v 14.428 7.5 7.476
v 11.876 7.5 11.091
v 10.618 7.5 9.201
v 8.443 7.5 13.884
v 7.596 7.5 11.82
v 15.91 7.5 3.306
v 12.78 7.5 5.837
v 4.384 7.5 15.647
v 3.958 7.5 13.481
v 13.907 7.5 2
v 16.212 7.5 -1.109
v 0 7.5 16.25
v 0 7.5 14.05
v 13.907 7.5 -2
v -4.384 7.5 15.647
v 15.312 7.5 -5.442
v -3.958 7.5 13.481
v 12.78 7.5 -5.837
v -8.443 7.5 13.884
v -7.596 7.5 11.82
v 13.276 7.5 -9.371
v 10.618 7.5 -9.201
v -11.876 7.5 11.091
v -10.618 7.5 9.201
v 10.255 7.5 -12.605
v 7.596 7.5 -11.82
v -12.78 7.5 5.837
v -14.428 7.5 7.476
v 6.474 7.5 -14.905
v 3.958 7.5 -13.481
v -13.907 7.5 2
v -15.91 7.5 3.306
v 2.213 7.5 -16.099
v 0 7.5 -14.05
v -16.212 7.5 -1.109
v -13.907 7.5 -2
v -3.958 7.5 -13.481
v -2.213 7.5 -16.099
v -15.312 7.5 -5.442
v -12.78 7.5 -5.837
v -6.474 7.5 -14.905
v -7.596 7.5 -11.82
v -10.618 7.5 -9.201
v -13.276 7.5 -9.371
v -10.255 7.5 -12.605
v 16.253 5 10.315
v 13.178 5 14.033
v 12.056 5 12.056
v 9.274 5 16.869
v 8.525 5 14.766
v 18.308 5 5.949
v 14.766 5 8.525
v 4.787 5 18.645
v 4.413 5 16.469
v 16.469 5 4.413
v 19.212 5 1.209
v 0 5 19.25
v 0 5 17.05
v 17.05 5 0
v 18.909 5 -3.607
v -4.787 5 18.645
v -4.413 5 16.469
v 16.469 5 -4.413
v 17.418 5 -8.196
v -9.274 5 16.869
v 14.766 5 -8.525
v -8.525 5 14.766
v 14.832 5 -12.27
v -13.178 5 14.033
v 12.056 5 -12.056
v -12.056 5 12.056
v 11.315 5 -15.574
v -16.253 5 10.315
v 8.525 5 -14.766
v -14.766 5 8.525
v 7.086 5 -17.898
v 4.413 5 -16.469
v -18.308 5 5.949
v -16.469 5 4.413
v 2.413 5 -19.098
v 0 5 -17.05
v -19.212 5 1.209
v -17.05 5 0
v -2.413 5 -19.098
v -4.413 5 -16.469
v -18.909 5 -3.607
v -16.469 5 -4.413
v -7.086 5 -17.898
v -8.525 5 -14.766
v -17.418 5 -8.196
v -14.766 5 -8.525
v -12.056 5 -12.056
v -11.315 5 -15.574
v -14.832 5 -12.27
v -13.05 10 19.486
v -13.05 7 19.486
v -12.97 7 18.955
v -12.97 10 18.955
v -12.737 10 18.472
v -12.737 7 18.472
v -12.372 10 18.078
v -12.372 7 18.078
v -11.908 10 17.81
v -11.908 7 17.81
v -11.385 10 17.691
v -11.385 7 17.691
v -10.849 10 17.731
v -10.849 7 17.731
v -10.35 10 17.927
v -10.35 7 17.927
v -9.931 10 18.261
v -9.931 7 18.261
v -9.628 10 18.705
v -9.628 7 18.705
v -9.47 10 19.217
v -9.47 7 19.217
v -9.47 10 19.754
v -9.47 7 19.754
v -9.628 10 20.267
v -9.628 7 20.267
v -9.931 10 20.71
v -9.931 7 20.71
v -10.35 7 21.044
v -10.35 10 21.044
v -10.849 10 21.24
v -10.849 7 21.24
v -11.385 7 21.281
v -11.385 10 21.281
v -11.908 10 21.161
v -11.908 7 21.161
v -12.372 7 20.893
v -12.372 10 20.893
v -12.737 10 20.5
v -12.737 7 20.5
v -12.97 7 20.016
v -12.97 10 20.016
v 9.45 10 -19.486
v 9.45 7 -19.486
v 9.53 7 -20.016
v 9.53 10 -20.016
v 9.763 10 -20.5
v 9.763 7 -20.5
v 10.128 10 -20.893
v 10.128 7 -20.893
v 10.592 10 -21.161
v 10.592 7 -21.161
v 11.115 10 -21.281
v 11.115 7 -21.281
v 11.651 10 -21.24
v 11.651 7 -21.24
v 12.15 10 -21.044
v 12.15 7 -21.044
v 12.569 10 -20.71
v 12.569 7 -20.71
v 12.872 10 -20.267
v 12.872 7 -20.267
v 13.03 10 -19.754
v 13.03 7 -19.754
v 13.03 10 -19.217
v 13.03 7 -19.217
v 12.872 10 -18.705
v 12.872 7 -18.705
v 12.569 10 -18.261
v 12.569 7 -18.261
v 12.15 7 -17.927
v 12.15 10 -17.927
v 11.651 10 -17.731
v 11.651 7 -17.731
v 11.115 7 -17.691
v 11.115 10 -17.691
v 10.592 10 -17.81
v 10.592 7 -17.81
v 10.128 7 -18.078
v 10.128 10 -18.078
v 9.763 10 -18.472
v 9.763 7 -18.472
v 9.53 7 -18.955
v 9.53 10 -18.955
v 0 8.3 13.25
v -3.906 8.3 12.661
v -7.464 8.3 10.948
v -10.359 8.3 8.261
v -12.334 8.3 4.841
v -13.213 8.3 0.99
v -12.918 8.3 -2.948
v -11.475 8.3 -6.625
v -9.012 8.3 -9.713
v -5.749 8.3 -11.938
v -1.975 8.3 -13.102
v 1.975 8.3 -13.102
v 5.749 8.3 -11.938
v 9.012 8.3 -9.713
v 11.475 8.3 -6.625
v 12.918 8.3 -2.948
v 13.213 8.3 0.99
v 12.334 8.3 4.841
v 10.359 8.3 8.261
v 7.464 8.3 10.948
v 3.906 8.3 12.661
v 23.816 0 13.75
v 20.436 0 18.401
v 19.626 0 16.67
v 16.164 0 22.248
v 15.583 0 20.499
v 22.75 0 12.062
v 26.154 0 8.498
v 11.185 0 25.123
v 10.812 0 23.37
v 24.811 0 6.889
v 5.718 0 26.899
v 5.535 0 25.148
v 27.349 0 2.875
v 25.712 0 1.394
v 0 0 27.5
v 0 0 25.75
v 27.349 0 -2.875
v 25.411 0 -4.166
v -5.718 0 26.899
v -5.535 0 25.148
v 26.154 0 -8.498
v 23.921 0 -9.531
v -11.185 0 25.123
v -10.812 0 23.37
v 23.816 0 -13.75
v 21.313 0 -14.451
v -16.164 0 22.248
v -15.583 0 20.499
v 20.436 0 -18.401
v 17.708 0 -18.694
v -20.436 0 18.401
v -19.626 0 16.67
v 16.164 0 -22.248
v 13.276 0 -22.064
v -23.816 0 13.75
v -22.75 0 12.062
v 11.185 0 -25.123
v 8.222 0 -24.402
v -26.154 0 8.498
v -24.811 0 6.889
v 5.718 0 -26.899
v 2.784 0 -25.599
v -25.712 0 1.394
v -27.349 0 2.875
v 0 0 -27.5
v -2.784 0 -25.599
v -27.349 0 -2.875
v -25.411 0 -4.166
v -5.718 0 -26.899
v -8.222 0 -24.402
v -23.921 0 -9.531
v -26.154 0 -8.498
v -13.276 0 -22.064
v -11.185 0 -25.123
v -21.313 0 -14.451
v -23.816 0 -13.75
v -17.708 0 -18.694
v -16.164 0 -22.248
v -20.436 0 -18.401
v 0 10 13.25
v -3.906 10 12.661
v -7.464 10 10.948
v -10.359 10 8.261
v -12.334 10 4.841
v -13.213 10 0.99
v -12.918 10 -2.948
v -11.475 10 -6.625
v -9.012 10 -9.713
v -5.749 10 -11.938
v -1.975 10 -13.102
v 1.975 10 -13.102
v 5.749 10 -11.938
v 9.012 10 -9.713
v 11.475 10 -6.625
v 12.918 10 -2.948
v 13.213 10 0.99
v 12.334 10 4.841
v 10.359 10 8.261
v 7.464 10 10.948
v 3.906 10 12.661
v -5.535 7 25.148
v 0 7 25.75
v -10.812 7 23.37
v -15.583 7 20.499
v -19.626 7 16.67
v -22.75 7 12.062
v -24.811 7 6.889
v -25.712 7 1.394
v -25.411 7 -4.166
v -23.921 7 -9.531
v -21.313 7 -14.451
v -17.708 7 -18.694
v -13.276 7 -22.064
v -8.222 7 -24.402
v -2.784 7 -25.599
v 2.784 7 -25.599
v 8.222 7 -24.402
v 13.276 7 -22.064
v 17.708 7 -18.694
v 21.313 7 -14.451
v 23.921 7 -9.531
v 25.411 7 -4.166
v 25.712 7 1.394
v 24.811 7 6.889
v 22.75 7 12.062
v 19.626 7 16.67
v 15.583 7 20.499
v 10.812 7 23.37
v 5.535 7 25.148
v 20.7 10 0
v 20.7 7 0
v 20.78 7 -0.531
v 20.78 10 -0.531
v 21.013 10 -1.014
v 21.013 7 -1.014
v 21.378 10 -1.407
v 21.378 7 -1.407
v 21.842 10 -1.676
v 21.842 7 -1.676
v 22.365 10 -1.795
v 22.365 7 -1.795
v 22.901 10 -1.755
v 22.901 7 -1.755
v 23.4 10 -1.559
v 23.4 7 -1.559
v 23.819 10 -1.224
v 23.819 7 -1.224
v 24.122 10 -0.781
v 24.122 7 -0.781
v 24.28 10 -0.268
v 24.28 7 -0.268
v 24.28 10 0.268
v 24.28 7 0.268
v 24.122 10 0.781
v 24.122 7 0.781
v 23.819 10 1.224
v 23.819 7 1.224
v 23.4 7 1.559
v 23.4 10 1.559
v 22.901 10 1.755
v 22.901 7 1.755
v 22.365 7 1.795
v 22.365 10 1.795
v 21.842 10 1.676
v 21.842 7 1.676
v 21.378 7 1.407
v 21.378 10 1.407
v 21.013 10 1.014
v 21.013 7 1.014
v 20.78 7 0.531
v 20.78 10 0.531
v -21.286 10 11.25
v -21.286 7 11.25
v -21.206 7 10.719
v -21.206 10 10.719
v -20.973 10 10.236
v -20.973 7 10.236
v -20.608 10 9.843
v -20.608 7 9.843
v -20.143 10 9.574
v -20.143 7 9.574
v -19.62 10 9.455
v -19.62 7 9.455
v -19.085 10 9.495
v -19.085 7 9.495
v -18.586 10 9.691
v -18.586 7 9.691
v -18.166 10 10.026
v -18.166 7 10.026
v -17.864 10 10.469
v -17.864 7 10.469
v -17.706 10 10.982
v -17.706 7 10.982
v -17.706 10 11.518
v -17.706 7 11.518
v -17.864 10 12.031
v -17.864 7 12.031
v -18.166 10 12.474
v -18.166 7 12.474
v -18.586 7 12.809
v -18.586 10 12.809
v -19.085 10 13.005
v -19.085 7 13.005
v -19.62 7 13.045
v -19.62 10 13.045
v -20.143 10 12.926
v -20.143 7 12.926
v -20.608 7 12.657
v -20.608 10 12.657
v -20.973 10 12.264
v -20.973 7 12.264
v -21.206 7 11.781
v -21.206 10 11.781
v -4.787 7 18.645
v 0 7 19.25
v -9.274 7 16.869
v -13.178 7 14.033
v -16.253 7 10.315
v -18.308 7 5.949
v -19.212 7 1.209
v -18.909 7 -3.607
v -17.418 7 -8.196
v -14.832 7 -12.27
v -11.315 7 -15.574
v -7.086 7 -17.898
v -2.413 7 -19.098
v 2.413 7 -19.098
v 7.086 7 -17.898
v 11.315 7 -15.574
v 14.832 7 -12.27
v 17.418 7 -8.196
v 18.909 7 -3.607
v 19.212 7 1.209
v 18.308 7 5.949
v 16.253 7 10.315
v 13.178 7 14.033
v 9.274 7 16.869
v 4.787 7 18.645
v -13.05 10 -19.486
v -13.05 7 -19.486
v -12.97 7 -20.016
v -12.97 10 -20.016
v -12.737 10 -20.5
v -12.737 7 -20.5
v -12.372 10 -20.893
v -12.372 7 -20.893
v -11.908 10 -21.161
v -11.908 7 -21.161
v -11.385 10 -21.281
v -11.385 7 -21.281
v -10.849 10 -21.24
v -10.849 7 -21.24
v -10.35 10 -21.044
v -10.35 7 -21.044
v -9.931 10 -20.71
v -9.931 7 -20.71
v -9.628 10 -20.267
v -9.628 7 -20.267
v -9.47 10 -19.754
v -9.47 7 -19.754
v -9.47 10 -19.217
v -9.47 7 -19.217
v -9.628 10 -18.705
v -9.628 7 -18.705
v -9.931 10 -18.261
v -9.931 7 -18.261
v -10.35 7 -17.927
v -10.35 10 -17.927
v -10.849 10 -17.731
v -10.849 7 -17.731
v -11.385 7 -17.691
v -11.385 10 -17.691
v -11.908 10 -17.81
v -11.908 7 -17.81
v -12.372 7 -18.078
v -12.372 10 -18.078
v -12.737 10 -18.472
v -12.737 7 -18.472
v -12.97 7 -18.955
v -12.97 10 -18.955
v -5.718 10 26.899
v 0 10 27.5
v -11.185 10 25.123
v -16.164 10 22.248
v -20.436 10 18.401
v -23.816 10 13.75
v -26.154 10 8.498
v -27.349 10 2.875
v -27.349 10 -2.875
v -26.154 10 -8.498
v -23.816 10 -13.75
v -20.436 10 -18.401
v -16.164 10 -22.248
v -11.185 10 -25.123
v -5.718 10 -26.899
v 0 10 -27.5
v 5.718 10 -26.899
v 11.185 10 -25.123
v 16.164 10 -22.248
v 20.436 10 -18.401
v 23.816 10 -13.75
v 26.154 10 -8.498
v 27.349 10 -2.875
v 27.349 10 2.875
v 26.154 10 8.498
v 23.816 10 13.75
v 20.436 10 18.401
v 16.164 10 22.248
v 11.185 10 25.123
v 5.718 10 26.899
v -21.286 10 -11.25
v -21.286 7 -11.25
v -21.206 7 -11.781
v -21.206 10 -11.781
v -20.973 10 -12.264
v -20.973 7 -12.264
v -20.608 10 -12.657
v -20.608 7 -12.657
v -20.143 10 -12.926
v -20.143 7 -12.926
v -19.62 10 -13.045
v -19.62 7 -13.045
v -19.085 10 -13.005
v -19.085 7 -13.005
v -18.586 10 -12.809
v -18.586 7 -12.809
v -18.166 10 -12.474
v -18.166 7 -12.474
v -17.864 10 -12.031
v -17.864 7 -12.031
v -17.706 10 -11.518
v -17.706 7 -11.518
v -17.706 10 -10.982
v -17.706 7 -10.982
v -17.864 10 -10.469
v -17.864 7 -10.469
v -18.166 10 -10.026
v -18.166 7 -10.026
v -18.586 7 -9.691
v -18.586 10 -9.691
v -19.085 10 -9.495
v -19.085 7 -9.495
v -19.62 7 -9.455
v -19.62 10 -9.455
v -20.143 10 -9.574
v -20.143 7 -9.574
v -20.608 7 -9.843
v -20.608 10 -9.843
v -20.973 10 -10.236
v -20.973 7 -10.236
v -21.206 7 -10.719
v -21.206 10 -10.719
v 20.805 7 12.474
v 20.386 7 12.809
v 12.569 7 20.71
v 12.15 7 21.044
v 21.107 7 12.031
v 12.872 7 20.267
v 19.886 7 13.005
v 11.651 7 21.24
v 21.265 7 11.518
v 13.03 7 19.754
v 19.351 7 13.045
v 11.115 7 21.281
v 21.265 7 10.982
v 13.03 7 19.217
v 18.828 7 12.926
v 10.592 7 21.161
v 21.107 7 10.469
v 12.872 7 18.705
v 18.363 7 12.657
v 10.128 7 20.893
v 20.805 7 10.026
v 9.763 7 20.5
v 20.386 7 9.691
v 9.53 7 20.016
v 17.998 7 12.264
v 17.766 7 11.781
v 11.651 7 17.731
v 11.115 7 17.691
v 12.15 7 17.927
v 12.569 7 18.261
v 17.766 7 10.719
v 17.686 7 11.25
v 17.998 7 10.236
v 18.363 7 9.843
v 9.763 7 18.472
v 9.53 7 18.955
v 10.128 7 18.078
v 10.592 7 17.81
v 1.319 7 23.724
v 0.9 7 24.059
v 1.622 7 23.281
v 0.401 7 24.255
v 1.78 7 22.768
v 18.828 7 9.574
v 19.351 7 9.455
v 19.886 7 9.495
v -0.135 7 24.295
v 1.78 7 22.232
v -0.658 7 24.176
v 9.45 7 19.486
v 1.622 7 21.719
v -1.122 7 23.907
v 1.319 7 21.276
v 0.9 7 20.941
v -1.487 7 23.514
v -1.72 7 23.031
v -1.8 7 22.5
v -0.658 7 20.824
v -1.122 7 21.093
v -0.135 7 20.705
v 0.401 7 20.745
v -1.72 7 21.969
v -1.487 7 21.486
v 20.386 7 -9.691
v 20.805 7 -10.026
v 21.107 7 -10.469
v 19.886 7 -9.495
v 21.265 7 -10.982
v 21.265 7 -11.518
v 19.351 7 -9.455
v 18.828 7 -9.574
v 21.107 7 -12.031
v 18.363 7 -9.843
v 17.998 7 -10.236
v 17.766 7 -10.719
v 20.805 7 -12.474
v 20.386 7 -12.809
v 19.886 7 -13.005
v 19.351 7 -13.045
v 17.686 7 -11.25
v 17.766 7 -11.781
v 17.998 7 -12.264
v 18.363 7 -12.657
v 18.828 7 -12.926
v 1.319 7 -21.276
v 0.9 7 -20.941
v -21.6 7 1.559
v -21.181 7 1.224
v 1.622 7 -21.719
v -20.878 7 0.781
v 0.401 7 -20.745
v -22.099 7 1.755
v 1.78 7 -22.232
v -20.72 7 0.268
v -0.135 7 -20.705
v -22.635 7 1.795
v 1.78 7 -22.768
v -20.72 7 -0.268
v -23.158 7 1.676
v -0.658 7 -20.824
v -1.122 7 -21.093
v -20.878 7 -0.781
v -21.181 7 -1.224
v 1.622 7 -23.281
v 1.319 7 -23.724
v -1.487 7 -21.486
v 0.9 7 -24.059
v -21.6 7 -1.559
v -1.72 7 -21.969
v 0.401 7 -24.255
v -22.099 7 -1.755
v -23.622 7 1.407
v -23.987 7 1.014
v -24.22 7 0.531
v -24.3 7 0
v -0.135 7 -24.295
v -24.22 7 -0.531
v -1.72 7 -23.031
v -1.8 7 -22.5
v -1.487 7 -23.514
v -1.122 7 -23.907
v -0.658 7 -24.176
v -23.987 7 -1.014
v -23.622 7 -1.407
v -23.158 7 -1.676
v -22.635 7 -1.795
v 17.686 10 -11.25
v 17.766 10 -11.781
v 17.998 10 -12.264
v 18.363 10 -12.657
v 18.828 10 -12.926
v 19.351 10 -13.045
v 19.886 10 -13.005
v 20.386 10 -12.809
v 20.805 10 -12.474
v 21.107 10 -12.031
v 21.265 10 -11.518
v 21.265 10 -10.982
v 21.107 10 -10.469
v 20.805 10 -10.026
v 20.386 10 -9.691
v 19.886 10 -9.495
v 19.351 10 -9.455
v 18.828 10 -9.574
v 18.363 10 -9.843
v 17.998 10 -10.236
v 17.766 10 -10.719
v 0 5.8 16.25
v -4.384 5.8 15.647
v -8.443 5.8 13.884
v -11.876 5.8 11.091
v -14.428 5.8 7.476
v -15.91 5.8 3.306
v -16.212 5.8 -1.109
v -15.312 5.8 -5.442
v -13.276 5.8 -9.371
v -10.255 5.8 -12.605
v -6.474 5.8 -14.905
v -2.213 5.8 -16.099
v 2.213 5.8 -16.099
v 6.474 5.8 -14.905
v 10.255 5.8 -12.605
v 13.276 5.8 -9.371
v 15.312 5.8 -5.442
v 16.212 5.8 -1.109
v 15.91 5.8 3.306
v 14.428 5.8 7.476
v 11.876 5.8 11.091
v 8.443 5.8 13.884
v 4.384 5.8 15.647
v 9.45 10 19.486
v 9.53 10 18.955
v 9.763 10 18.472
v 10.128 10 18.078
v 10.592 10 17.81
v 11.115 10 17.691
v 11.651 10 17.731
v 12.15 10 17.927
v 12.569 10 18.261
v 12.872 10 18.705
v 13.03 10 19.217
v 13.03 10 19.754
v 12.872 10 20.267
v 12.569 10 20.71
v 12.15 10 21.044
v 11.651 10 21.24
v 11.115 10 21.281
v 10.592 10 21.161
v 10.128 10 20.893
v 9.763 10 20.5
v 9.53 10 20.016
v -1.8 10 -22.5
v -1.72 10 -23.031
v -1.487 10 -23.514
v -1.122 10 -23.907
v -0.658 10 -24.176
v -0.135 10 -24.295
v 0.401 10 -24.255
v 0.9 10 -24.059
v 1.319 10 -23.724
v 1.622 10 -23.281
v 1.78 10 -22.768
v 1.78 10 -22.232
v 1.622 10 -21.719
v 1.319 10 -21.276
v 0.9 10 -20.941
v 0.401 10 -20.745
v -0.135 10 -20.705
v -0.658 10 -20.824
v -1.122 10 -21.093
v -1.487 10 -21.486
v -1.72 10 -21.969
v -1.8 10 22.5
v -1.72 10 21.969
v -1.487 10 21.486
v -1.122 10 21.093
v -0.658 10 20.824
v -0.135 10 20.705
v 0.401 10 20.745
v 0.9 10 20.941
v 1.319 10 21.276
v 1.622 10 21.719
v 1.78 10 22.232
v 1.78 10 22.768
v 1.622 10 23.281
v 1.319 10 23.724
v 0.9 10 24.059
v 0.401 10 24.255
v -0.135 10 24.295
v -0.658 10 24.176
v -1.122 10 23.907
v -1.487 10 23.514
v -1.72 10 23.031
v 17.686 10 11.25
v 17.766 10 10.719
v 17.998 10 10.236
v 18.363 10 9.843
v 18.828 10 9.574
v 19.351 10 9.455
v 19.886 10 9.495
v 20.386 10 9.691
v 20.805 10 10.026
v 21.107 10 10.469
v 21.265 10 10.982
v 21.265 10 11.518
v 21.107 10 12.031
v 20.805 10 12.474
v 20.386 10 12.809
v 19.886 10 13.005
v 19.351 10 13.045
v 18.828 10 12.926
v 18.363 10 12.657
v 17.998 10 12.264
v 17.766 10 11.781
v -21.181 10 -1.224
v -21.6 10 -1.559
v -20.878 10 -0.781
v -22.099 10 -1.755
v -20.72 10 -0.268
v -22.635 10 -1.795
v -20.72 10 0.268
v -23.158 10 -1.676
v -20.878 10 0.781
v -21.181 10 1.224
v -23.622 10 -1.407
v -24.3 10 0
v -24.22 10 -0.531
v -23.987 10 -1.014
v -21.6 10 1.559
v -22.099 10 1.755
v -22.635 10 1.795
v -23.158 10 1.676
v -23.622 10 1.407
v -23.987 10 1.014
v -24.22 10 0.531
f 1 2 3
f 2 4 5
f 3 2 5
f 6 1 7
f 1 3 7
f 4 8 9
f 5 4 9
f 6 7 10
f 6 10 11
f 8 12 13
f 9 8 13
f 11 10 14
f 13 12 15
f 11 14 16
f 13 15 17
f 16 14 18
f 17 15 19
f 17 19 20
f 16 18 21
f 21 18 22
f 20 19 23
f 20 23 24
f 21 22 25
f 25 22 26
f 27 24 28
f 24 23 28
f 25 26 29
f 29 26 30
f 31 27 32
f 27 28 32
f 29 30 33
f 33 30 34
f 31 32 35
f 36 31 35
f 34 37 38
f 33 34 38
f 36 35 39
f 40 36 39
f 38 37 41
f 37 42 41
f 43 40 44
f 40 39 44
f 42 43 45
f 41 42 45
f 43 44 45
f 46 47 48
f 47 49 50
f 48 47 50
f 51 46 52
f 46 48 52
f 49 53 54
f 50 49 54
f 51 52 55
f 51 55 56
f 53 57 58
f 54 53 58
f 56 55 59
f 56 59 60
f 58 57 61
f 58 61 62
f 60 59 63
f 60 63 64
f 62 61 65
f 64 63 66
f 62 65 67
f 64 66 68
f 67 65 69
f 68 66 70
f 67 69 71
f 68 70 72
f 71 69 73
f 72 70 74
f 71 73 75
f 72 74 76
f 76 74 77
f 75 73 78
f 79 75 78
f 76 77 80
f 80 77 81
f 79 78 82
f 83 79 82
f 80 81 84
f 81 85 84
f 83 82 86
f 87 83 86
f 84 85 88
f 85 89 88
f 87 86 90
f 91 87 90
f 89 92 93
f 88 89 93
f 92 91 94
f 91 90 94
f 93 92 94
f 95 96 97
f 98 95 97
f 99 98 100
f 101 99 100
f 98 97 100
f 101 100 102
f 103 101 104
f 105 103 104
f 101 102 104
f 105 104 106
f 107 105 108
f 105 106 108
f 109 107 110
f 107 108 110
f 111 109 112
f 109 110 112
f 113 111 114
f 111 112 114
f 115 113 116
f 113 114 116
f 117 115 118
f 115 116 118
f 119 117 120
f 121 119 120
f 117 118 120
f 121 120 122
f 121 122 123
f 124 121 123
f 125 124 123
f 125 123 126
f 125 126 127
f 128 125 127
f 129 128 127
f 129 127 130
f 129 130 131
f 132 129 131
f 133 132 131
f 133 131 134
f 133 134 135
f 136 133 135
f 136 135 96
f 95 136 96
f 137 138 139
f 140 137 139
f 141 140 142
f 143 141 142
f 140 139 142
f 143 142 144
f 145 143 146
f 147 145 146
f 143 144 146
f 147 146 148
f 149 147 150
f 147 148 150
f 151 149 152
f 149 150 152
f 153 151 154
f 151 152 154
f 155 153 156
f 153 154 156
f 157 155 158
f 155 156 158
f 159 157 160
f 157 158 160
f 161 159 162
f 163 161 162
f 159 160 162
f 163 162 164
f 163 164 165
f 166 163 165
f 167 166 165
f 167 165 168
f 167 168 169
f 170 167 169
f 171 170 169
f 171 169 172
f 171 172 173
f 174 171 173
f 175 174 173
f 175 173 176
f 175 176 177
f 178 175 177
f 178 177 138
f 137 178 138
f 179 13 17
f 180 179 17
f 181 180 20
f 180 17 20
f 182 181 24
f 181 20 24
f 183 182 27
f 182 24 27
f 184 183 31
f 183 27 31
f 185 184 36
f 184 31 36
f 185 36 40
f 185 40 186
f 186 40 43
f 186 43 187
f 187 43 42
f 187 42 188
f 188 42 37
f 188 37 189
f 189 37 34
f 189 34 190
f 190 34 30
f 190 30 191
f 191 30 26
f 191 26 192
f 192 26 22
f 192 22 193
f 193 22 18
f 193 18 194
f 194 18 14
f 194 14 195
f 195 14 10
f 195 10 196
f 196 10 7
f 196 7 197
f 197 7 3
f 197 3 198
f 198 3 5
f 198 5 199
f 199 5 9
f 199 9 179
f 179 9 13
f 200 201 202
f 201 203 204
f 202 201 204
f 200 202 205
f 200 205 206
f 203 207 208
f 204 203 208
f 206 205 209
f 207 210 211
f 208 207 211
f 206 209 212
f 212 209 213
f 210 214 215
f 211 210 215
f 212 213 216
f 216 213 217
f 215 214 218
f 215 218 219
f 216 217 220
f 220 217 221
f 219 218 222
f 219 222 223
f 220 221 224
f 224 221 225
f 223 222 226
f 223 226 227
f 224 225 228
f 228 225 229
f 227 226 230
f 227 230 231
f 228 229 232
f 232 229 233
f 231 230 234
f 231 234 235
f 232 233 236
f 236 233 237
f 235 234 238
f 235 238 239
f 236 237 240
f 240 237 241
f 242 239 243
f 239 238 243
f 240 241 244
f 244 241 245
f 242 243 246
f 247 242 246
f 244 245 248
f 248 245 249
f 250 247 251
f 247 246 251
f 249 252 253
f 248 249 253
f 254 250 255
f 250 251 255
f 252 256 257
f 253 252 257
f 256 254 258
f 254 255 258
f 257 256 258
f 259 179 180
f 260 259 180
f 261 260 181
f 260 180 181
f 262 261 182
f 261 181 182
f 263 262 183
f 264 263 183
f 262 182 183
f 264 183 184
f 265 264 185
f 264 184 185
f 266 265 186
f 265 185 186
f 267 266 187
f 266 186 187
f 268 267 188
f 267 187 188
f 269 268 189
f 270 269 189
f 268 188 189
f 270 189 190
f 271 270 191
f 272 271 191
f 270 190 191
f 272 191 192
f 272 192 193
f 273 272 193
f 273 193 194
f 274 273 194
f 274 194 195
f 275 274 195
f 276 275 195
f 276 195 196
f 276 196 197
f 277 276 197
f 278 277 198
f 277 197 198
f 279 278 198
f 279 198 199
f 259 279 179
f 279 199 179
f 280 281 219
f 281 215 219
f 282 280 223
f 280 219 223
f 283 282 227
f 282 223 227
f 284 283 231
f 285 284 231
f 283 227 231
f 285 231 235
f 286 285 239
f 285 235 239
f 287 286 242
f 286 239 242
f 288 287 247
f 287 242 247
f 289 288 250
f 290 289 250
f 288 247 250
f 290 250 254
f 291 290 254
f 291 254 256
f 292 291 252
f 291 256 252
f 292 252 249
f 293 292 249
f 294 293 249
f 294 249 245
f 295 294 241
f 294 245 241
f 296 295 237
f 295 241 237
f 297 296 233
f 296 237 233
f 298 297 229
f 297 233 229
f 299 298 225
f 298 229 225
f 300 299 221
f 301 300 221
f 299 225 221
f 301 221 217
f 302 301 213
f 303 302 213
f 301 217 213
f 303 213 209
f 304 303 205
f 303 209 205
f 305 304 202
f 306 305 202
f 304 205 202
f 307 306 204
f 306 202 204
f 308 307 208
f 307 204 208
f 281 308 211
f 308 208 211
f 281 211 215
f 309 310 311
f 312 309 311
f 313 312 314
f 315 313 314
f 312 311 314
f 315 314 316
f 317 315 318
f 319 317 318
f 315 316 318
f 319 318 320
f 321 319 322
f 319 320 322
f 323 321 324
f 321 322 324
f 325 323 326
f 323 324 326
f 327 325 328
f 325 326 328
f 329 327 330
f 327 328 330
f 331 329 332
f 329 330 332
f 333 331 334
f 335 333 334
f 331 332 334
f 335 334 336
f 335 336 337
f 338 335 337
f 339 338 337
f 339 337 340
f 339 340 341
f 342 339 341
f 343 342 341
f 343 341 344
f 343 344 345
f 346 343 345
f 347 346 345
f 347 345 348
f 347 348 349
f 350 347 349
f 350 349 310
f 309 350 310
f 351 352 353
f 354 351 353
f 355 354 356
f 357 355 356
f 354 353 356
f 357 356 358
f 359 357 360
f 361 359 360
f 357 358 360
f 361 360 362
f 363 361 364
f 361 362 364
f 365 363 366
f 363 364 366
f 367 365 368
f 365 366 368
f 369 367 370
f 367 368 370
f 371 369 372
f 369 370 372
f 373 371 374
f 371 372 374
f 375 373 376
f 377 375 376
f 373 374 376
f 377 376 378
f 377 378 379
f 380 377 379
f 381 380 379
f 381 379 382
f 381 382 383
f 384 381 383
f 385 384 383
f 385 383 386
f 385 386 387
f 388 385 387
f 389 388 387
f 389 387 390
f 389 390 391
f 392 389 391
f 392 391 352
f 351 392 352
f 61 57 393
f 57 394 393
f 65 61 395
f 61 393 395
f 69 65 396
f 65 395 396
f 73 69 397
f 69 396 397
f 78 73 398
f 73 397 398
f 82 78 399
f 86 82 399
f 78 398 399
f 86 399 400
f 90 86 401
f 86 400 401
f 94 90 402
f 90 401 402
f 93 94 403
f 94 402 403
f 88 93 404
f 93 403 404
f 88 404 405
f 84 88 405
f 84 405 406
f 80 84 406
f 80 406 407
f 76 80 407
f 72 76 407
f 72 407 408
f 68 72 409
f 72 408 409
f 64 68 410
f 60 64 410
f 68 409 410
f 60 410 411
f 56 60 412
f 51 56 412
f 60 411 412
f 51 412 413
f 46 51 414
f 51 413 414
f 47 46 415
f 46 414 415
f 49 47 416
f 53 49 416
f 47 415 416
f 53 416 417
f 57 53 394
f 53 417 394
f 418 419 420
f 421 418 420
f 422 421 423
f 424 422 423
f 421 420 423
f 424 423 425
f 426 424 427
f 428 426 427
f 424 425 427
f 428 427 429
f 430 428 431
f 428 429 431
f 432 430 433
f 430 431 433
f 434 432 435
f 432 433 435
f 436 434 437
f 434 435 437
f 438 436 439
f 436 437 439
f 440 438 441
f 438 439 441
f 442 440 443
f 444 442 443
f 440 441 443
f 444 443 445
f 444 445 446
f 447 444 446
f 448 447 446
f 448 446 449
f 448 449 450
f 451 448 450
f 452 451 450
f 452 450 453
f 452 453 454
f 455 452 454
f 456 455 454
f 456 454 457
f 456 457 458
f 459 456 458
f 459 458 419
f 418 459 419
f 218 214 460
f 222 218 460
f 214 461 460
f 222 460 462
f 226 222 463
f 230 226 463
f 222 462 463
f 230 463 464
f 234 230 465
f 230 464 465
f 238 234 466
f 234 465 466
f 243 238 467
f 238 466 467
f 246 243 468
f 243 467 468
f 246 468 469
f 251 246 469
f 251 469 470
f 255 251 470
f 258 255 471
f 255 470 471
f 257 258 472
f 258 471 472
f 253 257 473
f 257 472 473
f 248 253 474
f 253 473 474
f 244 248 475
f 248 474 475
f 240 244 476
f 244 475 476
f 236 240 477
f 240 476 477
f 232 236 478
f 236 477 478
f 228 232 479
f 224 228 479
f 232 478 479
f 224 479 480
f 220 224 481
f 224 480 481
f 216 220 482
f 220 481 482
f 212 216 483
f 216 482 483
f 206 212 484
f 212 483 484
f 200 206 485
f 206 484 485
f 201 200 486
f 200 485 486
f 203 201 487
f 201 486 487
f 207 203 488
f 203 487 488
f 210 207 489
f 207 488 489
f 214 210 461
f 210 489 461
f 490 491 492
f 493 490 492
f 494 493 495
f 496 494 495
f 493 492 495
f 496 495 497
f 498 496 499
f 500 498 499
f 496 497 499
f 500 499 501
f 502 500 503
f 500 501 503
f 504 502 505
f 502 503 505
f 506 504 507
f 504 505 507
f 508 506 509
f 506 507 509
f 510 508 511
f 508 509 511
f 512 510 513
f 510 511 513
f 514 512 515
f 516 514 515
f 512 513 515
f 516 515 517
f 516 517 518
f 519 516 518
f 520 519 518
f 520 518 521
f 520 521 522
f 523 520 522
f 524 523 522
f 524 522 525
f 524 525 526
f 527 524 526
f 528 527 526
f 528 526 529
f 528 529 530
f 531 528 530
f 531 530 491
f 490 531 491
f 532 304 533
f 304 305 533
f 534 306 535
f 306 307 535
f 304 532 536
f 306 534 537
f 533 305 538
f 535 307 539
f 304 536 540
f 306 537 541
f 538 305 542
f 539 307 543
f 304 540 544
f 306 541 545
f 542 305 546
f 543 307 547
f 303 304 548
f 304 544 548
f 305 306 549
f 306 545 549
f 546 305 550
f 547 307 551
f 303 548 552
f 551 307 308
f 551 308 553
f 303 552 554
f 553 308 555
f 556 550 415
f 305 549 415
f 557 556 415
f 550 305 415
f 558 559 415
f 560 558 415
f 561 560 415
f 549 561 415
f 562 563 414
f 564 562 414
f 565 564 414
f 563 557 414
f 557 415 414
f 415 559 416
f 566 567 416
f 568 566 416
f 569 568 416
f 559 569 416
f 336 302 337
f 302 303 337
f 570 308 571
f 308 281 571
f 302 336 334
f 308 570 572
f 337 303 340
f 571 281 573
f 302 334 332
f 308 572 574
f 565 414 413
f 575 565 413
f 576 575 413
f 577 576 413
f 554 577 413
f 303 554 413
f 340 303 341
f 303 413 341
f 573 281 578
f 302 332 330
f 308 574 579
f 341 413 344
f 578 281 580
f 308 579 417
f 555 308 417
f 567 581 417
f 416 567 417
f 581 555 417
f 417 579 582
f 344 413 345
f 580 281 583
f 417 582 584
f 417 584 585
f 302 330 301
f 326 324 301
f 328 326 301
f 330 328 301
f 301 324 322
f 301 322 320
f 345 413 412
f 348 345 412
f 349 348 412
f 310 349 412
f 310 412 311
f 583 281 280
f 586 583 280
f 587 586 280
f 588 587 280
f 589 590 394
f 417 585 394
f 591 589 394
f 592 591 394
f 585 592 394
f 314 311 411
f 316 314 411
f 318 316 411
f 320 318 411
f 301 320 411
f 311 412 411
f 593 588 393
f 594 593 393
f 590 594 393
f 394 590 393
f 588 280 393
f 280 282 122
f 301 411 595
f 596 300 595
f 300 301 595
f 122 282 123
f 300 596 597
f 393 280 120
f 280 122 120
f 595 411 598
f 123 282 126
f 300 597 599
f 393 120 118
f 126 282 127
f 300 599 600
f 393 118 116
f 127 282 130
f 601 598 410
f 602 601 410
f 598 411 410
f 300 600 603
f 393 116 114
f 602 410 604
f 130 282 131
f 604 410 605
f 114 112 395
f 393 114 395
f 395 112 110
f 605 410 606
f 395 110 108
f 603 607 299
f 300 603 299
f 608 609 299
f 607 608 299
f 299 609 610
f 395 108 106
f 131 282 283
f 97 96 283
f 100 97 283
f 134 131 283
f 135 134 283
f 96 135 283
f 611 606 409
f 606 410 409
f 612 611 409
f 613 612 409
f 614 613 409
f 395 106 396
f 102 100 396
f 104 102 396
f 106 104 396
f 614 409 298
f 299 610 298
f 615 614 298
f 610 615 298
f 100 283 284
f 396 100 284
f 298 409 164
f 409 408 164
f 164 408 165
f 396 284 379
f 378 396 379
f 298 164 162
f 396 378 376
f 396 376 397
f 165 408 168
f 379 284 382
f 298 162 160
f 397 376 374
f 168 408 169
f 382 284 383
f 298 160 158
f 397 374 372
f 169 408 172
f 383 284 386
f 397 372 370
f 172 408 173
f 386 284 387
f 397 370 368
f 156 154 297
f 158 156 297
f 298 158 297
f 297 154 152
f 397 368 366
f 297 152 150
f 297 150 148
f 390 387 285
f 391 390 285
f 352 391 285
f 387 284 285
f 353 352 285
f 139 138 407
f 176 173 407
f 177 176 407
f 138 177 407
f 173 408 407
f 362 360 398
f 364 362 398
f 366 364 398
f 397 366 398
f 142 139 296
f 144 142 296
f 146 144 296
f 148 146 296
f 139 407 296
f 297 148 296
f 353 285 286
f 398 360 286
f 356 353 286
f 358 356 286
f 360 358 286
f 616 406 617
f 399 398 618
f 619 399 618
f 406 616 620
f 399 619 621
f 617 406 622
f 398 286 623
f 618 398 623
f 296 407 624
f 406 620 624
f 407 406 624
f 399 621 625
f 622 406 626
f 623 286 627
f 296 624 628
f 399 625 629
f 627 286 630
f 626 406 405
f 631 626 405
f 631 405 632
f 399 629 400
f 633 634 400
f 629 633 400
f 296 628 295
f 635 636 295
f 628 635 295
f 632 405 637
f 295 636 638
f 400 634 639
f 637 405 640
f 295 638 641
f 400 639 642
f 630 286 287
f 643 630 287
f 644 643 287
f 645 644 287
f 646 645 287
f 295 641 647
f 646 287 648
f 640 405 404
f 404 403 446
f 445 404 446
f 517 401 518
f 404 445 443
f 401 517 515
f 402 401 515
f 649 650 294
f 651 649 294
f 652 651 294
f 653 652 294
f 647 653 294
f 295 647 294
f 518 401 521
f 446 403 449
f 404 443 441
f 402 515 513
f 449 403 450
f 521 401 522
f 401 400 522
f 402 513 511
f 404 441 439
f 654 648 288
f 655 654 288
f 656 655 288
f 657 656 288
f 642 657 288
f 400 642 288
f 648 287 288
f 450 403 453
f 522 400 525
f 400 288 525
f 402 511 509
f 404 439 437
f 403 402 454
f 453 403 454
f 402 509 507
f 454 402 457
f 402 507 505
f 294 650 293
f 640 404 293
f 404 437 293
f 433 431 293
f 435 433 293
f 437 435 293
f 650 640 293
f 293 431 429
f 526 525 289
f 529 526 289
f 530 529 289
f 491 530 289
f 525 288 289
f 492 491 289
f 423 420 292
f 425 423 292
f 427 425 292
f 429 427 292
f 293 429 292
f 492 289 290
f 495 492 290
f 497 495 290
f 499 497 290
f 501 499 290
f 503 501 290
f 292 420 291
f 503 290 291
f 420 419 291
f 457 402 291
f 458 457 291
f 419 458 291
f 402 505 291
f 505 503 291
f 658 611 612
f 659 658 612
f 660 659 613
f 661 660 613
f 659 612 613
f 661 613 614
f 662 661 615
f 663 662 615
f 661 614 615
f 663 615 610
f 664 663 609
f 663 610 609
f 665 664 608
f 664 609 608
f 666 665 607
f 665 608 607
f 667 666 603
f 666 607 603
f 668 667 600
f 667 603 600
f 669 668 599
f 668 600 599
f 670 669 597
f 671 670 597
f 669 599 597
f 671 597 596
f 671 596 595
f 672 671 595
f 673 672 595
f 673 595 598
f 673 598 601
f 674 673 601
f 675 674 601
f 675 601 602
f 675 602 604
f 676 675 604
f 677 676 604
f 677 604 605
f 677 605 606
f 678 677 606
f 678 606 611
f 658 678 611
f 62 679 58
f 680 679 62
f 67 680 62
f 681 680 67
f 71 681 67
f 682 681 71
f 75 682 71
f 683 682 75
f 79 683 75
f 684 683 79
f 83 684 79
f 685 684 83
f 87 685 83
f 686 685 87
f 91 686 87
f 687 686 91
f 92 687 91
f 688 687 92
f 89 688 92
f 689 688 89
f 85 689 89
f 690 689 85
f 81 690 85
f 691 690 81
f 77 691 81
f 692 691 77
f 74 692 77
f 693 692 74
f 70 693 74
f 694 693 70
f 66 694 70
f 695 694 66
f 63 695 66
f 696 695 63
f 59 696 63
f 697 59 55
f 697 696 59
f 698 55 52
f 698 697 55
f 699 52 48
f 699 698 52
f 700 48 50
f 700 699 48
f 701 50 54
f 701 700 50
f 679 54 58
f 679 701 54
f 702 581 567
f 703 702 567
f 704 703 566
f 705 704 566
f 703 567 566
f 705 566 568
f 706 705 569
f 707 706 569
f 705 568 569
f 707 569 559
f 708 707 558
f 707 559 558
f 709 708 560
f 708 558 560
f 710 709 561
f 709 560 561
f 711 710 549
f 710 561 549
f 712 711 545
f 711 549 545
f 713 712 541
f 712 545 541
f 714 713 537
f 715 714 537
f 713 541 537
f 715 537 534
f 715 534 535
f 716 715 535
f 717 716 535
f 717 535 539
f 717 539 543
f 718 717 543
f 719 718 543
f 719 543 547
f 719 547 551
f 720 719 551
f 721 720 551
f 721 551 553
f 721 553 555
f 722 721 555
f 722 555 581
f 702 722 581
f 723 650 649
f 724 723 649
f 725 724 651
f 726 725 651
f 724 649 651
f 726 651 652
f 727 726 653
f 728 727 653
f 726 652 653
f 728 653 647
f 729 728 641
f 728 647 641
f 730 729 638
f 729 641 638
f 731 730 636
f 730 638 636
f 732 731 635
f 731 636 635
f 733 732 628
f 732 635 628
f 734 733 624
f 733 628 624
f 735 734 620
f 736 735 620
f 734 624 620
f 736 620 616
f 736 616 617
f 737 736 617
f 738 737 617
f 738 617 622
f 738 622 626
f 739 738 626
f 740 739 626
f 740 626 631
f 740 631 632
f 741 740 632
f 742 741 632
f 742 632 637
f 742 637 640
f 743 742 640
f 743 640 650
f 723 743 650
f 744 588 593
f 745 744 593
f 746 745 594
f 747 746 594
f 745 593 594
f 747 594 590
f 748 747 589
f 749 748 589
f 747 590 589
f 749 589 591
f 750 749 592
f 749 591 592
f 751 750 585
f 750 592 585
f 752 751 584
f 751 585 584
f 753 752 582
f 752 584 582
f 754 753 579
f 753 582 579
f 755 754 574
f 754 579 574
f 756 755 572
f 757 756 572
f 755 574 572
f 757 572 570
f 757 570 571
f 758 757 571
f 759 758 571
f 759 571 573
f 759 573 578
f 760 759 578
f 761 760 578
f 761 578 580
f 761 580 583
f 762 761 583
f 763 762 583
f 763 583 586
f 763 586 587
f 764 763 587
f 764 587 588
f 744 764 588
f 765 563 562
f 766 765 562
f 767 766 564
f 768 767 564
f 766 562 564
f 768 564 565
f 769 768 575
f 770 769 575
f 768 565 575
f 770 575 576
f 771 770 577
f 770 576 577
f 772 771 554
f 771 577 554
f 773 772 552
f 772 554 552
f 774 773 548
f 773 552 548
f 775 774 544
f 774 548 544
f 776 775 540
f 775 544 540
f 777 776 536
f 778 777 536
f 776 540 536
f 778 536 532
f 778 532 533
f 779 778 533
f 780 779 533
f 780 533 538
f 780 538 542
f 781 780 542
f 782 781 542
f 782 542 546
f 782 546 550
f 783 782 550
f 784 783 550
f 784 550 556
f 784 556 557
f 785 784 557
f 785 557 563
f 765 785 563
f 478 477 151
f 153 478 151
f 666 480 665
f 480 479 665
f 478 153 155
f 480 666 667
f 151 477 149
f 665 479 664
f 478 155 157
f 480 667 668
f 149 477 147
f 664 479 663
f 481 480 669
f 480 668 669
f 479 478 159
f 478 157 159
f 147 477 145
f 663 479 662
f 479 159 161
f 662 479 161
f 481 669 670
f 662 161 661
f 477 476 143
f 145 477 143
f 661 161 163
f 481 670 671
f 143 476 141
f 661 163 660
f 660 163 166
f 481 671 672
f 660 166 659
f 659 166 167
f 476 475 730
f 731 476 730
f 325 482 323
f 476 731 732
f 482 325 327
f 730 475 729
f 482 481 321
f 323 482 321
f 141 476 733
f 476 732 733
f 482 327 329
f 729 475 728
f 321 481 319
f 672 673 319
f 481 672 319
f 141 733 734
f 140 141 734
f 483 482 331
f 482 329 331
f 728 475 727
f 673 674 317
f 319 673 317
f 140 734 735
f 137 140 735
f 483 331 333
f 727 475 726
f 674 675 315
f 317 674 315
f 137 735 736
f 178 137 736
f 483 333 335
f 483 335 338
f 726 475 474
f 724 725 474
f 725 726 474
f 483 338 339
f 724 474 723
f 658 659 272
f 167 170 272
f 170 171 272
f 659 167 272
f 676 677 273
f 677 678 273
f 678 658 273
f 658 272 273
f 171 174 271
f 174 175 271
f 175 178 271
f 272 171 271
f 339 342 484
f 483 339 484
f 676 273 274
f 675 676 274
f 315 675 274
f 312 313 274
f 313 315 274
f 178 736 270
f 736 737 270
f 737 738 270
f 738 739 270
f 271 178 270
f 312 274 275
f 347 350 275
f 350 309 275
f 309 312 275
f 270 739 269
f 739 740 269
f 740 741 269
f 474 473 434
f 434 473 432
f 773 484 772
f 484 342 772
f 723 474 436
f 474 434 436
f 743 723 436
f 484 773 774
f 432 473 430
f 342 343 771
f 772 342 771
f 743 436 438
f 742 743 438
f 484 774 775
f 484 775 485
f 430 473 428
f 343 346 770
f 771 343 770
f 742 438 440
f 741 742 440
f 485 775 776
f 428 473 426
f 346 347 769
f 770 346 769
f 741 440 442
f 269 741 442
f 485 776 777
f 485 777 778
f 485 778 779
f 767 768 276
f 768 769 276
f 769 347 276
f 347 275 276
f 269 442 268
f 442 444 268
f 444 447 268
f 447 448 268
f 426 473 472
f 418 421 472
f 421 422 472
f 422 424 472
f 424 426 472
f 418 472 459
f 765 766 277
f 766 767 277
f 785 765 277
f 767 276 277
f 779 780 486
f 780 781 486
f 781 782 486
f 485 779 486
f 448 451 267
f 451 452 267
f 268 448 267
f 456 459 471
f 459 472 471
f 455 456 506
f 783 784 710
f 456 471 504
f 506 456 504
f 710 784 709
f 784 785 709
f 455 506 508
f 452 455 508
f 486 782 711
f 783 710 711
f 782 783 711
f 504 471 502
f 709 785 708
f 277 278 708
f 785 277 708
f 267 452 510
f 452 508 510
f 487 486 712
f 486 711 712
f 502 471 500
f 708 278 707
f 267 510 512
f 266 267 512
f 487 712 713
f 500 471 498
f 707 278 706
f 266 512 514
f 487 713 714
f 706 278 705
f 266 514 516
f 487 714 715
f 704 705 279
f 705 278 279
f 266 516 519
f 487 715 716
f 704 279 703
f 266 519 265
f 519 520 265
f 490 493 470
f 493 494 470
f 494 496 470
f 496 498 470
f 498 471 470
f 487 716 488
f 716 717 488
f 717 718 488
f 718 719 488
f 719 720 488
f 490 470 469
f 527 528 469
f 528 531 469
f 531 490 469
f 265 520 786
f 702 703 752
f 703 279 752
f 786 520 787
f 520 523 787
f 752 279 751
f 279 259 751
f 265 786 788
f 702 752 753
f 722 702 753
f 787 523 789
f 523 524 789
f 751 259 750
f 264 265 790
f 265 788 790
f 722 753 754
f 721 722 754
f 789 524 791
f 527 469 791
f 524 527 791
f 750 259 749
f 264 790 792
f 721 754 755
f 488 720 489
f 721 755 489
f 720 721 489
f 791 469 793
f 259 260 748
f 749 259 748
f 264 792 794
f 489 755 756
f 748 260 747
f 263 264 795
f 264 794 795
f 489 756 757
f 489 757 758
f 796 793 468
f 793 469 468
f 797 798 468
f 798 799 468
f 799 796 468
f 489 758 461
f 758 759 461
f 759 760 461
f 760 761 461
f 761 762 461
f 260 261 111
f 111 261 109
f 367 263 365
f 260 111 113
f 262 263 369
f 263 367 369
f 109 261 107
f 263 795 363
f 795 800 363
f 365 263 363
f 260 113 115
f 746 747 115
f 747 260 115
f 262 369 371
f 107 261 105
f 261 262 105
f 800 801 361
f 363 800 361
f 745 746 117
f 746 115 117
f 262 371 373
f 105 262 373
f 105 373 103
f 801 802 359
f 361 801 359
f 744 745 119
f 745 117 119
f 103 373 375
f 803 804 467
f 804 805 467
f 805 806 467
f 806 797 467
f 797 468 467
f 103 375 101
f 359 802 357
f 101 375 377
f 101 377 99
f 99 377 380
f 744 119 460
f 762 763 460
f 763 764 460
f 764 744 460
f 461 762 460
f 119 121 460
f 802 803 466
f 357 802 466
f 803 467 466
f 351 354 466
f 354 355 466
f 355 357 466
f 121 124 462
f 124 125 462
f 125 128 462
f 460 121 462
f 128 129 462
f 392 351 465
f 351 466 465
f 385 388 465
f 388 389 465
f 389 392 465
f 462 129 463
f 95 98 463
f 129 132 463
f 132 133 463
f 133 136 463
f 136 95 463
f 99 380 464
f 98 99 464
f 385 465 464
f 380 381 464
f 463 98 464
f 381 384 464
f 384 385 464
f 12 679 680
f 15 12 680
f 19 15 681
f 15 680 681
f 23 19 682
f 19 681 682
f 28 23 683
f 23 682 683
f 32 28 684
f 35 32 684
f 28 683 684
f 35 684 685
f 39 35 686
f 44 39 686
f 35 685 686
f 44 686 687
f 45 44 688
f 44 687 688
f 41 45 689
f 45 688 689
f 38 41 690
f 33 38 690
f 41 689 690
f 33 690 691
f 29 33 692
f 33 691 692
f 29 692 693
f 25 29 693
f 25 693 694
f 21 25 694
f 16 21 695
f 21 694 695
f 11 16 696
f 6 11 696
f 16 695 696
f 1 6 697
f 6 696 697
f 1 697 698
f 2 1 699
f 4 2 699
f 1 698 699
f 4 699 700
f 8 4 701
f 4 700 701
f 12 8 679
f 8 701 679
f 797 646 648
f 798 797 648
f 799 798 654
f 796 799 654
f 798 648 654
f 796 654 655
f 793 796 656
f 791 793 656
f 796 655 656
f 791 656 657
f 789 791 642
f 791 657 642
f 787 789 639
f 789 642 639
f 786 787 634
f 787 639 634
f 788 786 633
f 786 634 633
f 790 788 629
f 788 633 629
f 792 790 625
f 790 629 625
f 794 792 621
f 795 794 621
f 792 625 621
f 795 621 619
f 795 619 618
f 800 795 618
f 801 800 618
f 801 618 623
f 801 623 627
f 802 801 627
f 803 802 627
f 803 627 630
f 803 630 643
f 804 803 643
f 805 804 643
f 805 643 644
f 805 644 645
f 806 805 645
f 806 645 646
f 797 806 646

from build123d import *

# Parameters (mm, degrees)
M3_CLEARANCE_HOLE1_D = 3.6
CHAMFER1_SIZE        = 0.8


with BuildPart() as part:
    # Sketch1 → Revolve1 (revolve)
    with BuildSketch(Plane.XY, mode=Mode.PRIVATE) as revolve1_sk:
        Polygon((-25.75, 0), (-27.5, 0), (-27.5, 10), (-13.25, 10), (-13.25, 7.5), (-16.25, 7.5), (-16.25, 5), (-19.25, 5), (-19.25, 7), (-25.75, 7), align=None)
    revolve(revolve1_sk.sketch.rotate(Axis((0, 0, 0), (0, -1, 0)), 270), axis=Axis((0, 0, 0), (0, -1, 0)))

    # M3 Clearance Hole1 (through all)
    with Locations(Plane(origin=(0, 10, 0), x_dir=(1, 0, 0), z_dir=(0, 1, 0))):
        with Locations((-22.5, 0), (-19.485571585, 11.25), (-11.25, 19.485571585), (0, 22.5), (11.25, 19.485571585), (19.485571585, 11.25), (22.5, 0), (19.485571585, -11.25), (11.25, -19.485571585), (0, -22.5), (-11.25, -19.485571585), (-19.485571585, -11.25)):
            Hole(M3_CLEARANCE_HOLE1_D / 2)

    # Chamfer1
    chamfer1_edges = [part.edges().sort_by_distance(p)[0] for p in [
        (0, 7.5, -13.25),
        (0, 5, -16.25),
    ]]
    chamfer(chamfer1_edges, length=CHAMFER1_SIZE)


solid = part.part
